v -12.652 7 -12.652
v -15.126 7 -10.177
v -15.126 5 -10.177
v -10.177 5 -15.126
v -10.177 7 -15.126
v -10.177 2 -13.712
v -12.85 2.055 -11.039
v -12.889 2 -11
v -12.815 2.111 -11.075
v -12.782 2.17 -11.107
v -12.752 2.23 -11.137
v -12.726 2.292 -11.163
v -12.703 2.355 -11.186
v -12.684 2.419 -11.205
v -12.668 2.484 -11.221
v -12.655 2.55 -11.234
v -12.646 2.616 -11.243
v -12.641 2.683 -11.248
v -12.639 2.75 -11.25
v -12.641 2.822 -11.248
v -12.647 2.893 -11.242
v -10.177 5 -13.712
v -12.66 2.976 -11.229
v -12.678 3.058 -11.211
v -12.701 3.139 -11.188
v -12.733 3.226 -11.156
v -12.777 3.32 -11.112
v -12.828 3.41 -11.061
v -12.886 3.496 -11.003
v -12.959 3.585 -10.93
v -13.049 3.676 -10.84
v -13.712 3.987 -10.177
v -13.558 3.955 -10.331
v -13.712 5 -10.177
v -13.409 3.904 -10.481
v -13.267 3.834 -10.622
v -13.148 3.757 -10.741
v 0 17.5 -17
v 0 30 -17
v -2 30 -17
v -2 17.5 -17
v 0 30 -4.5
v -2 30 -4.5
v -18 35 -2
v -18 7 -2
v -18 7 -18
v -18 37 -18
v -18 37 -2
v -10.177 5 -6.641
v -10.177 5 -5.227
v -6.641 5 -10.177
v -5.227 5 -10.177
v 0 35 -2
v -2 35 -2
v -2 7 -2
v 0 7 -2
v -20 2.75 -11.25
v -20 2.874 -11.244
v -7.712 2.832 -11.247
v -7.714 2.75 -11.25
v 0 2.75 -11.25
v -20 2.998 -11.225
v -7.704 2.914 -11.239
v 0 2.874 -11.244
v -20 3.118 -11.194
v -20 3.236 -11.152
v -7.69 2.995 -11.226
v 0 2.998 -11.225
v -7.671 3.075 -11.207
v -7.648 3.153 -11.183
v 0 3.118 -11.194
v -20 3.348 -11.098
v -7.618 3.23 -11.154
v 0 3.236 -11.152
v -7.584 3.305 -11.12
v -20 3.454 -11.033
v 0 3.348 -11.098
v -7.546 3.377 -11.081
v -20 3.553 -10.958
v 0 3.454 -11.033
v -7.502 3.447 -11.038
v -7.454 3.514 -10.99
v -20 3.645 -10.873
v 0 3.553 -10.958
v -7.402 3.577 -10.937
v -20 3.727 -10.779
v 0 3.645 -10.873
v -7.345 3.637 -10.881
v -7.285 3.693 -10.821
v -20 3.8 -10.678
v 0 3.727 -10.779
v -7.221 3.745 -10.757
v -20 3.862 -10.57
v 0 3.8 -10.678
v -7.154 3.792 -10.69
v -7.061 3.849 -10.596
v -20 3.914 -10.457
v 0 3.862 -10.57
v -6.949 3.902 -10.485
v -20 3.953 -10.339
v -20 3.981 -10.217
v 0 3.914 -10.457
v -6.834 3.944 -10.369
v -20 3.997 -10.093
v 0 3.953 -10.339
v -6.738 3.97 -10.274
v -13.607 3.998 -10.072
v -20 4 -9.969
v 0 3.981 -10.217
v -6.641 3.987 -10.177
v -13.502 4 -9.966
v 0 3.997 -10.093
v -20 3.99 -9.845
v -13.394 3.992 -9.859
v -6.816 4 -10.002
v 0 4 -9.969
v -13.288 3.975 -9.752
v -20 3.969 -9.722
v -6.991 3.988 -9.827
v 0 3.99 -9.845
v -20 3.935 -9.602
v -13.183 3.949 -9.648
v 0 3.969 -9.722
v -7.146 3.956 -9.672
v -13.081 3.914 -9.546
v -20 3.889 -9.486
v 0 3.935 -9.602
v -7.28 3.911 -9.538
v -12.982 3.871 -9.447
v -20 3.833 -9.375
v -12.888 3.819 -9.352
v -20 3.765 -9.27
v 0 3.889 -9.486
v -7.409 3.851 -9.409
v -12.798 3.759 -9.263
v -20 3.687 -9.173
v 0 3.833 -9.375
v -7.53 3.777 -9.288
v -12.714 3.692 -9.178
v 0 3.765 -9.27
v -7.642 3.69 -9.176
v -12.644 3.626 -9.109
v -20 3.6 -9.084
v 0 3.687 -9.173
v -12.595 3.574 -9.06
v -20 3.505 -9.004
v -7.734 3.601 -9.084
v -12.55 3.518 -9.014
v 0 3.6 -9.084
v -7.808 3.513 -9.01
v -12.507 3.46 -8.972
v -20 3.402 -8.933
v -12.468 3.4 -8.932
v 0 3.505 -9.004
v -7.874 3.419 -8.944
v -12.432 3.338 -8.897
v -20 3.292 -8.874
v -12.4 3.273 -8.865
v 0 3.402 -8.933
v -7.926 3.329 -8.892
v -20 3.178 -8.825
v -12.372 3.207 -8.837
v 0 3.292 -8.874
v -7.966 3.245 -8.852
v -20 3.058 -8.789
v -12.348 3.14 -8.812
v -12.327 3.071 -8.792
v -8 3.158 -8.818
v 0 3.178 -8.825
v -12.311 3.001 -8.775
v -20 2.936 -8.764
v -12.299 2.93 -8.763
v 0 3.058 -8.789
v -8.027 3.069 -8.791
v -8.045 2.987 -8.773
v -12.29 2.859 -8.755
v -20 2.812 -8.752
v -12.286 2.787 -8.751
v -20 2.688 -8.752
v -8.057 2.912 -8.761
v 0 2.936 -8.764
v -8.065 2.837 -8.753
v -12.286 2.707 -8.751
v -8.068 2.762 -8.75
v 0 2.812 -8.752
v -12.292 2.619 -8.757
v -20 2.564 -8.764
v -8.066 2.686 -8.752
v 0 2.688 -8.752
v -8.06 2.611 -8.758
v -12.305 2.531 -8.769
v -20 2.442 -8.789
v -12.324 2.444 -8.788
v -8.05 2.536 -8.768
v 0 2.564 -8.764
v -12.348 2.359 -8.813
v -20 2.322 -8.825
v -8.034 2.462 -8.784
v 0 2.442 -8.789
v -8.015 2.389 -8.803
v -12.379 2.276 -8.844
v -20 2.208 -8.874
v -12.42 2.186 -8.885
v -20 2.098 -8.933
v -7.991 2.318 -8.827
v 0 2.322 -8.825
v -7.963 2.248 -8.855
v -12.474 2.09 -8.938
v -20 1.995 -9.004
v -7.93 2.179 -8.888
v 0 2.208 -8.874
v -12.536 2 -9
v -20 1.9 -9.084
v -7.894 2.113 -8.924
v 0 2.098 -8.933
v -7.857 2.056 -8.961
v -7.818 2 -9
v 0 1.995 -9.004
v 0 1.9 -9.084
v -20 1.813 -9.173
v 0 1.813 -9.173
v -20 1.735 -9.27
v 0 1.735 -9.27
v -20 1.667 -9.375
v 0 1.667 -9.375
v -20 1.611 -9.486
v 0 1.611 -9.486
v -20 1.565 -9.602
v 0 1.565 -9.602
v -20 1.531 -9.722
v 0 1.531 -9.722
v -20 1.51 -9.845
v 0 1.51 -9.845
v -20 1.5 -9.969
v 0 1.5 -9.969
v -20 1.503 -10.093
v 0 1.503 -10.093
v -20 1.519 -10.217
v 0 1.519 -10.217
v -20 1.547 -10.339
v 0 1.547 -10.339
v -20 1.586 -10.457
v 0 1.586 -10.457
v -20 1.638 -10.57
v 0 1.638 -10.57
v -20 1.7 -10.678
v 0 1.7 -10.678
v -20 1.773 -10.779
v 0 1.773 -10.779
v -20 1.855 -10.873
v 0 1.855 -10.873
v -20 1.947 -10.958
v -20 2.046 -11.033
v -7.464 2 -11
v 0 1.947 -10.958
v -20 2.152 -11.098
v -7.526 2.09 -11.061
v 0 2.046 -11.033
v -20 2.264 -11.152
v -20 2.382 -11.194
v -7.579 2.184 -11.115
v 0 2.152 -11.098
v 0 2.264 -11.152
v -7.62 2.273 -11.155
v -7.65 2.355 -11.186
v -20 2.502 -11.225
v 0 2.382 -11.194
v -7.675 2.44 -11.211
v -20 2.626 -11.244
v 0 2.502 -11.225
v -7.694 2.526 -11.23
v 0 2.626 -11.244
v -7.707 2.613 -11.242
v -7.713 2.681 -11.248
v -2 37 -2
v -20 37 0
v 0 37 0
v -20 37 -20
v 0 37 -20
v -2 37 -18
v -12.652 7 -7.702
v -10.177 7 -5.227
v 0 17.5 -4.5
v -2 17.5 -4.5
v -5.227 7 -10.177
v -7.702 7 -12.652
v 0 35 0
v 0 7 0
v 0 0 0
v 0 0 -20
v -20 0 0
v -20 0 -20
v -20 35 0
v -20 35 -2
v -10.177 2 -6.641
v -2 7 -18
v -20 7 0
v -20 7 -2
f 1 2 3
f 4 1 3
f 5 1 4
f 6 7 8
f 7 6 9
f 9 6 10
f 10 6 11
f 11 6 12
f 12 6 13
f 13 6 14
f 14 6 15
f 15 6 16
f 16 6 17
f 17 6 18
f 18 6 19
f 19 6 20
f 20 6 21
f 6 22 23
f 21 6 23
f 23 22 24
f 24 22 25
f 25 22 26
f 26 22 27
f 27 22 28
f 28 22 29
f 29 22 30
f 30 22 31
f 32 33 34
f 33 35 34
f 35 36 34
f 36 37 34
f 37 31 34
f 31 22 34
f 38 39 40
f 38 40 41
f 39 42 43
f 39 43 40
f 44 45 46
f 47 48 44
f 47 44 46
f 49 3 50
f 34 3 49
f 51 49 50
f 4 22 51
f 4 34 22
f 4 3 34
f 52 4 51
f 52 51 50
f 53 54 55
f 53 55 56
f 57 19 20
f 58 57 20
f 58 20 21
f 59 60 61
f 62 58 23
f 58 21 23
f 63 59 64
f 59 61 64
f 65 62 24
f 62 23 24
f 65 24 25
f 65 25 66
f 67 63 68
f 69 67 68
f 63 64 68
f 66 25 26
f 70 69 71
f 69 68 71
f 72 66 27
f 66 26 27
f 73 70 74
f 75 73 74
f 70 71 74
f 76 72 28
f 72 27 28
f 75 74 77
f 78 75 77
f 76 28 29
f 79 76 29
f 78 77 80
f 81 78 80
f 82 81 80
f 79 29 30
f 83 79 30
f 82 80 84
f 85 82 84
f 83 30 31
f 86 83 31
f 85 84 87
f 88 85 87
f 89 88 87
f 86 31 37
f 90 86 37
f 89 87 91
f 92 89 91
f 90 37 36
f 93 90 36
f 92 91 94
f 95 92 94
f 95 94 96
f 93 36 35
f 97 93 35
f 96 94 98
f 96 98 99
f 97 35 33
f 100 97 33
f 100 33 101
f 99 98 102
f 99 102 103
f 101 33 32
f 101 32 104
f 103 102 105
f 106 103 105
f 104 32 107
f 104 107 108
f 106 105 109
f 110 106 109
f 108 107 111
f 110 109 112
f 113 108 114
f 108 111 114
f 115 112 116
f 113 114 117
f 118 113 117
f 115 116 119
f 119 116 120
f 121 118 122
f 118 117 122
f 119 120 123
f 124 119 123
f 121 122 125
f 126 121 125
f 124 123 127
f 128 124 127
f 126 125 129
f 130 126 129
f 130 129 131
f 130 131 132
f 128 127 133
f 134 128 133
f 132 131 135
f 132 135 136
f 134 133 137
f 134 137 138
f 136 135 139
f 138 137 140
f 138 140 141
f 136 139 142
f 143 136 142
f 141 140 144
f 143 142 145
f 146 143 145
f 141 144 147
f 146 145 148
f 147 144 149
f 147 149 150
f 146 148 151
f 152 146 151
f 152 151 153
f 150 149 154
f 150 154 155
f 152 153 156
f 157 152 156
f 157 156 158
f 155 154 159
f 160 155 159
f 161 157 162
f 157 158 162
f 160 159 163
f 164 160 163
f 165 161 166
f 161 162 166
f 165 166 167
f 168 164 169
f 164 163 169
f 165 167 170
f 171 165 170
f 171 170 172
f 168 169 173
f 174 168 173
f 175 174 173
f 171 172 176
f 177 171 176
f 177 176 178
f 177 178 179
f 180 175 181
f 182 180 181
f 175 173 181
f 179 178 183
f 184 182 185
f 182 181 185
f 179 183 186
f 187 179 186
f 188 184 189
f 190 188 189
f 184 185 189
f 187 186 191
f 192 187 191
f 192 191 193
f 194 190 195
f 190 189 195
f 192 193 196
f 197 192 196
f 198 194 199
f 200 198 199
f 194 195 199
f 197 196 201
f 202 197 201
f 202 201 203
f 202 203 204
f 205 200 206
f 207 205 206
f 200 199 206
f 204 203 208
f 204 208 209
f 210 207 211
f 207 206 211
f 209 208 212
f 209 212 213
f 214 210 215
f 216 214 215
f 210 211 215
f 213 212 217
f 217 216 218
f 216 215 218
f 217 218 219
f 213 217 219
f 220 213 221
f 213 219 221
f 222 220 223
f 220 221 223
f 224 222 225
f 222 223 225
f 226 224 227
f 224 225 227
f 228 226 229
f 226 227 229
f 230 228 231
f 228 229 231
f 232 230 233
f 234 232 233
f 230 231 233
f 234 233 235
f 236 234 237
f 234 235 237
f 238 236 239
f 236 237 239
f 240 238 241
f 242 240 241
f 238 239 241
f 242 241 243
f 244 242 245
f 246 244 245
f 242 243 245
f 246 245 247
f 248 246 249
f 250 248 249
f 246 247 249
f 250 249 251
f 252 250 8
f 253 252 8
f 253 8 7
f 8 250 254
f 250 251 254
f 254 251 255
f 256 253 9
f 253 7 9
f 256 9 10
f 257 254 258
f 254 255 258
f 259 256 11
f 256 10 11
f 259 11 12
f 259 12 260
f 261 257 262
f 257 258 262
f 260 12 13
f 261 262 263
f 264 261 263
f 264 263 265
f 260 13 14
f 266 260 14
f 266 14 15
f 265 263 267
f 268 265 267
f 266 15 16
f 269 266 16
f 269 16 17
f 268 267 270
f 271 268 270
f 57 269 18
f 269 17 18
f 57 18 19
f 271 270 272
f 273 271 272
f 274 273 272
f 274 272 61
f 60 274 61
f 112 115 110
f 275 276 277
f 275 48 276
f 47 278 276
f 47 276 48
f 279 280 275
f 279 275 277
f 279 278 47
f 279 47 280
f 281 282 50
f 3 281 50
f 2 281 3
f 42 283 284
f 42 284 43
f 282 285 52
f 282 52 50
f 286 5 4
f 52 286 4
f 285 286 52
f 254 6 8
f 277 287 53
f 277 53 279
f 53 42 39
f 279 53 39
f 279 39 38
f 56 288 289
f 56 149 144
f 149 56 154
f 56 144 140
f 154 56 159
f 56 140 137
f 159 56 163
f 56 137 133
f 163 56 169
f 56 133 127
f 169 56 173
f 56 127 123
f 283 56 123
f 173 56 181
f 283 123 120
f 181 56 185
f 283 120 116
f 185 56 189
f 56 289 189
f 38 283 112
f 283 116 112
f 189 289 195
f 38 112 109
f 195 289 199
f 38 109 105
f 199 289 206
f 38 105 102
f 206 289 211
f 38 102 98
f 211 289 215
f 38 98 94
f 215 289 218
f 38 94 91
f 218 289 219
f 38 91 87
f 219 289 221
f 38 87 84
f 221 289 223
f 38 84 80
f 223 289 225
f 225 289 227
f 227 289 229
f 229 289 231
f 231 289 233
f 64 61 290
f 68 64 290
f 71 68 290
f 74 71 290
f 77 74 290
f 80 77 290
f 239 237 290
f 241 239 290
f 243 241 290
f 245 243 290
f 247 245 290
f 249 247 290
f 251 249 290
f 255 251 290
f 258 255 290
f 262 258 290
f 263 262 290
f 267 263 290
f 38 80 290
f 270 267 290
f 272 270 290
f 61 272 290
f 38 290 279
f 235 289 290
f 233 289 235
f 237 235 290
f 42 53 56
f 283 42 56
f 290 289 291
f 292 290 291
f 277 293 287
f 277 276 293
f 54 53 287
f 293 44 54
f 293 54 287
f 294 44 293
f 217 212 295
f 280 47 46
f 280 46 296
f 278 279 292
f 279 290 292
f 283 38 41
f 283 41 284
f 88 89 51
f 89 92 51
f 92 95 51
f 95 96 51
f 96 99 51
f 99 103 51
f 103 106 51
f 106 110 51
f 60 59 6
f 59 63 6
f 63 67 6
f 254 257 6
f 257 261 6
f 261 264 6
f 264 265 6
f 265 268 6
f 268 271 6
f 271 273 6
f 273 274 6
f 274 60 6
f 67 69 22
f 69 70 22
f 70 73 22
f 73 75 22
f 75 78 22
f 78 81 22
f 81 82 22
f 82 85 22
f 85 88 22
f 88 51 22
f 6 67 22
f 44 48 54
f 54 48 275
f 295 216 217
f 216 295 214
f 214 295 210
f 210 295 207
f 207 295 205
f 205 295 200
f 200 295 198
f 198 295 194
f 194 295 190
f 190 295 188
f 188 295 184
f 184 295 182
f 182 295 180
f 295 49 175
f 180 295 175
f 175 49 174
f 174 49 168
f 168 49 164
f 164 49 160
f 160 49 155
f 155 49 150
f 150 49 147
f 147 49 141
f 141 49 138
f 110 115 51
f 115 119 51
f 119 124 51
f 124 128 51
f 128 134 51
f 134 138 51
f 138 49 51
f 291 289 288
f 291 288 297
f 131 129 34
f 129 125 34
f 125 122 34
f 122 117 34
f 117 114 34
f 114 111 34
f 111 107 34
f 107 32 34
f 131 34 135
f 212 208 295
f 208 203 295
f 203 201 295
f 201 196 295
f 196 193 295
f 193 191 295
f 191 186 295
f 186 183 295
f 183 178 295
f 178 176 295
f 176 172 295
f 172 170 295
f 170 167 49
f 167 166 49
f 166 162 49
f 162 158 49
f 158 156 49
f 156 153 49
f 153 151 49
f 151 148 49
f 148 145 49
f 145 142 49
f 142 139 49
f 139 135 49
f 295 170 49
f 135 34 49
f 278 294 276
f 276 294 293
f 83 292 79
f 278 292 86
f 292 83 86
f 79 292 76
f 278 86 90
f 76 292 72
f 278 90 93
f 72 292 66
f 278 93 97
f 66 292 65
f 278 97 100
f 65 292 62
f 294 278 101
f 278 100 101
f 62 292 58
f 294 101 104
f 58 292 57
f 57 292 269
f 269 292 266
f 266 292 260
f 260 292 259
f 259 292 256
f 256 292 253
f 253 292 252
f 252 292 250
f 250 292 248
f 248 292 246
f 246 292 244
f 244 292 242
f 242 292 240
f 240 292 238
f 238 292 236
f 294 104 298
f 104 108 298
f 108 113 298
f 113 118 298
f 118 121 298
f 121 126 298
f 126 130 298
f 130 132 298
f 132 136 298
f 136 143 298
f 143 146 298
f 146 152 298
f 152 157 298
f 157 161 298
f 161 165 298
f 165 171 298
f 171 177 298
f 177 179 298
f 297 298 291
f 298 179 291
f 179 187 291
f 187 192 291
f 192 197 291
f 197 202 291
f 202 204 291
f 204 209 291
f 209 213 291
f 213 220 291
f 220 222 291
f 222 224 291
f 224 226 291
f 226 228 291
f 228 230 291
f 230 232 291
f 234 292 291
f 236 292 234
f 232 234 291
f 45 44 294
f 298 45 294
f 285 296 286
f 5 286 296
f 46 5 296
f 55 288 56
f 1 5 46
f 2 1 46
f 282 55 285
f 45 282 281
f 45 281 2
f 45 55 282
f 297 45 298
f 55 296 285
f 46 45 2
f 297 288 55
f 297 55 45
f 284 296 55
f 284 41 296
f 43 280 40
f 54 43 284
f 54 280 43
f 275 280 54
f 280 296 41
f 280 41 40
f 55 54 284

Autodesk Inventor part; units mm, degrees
ref_plane "YZ Plane" through (0, 0, 0) normal (1, 0, 0) x (0, 1, 0)
sketch "Sketch1" plane through (0, 0, 0) normal (0, 1, 0) x (-1, 0, 0)
  line L0 (0, 0) -> (20, 0)
  line L1 (20, 0) -> (20, -20)
  line L2 (20, -20) -> (0, -20)
  line L3 (0, -20) -> (0, 0)
  dimension "d0" = 20
  dimension "d1" = 20
extrude "Extrusion1" add sketch "Sketch1" along normal blind 10
sketch "Sketch4" plane through (0, 10, 0) normal (0, 1, 0) x (1, 0, 0)
  line L0 (0, 20) -> (-20, 20) projected
  line L1 (-20, 20) -> (-20, 0) projected
  line L2 (-20, 0) -> (0, 0) projected
  line L3 (0, 0) -> (0, 20) projected
  line L4 (0, 20) -> (-20, 20) projected
  line L5 (-20, 20) -> (0, 0)
  line L6 (-10.1768, 10.1768) -> (-7.7019, 12.6517)
  line L7 (-7.7019, 12.6517) -> (-5.227, 10.1768)
  line L8 (-5.227, 10.1768) -> (-7.7019, 7.7019)
  line L9 (-7.7019, 7.7019) -> (-10.1768, 10.1768)
  line L10 (-10.1768, 10.1768) -> (-12.6517, 7.7019)
  line L11 (-12.6517, 7.7019) -> (-15.1265, 10.1768)
  line L12 (-15.1265, 10.1768) -> (-12.6517, 12.6517)
  line L13 (-12.6517, 12.6517) -> (-10.1768, 10.1768)
  line L14 (-12.6517, 12.6517) -> (-10.1768, 15.1265)
  line L15 (-10.1768, 15.1265) -> (-7.7019, 12.6517)
  line L16 (-7.7019, 12.6517) -> (-10.1768, 10.1768)
  line L17 (-10.1768, 10.1768) -> (-12.6517, 12.6517)
  line L18 (-12.6517, 7.7019) -> (-10.1768, 10.1768)
  line L19 (-10.1768, 10.1768) -> (-7.7019, 7.7019)
  line L20 (-7.7019, 7.7019) -> (-10.1768, 5.227)
  line L21 (-10.1768, 5.227) -> (-12.6517, 7.7019)
  dimension "d10" = 3.5
  dimension "d11" = 3.5
  dimension "d12" = 3.5
  dimension "d13" = 3.5
extrude "Extrusion3" cut sketch "Sketch4" against normal blind 8 contours L14 L15 L6 L5 | L5 L10 L11 L12 | L20 L21 L10 L5 | L5 L6 L7 L8
sketch "Sketch5" plane through (0, 10, 0) normal (0, 1, 0) x (1, 0, 0)
  line L0 (-5.227, 10.1768) -> (-10.1768, 5.227) projected
  line L1 (-10.1768, 5.227) -> (-15.1265, 10.1768) projected
  line L2 (-15.1265, 10.1768) -> (-10.1768, 15.1265) projected
  line L3 (-10.1768, 15.1265) -> (-5.227, 10.1768) projected
  line L4 (0, 20) -> (-20, 20) projected
  line L5 (-20, 20) -> (-20, 0) projected
  line L6 (-20, 0) -> (0, 0) projected
  line L7 (0, 0) -> (0, 20) projected
  line L8 (-18, 18) -> (-2, 18)
  line L9 (-2, 18) -> (-2, 2)
  line L10 (-2, 2) -> (-18, 2)
  line L11 (-18, 2) -> (-18, 18)
  line L12 (-18, 2) -> (-18, 0)
  line L13 (-2, 2) -> (-2, 0)
  line L14 (-20, 0) -> (0, 0) projected
  line L15 (-18, 2) -> (-20, 2)
  line L16 (-20, 20) -> (-20, 0) projected
  line L17 (-2, 2) -> (0, 2)
  line L18 (0, 0) -> (0, 20) projected
  point P0 (0, 2)
  dimension "d16" = 2
extrude "Extrusion4" add sketch "Sketch5" along normal blind 27 contours L7 L17 L9 L8 L11 L15 L5 L4
ref_plane "Work Plane1" through (-10, 10, -2) normal (1, 0, 0) x (0, 0, -1)
sketch "Sketch6" plane through (-10, 10, -2) normal (1, 0, 0) x (0, 0, -1)
  line L0 (3.227, 0) -> (8.1768, 0) projected
  line L1 (3.227, 0) -> (3.227, -8) projected
  line L2 (3.227, -8) -> (8.1768, -8) projected
  line L3 (8.1768, 0) -> (8.1768, -8) projected
  line L4 (8.1768, 0) -> (13.1265, 0) projected
  line L5 (8.1768, 0) -> (8.1768, -8) projected
  line L6 (8.1768, -8) -> (13.1265, -8) projected
  line L7 (13.1265, 0) -> (13.1265, -8) projected
  line L8 (16, 0) -> (0, 0) projected
  line L9 (16, 0) -> (16, 27) projected
  line L10 (0, 27) -> (16, 27) projected
  line L11 (0, 0) -> (0, 27) projected
  line L12 (8.1768, 0) -> (8.1768, -8) projected
  line L13 (8.1768, -8) -> (8.1768, -7.25)
  circle A0 centre (8.1768, -7.25) radius 0.75
  point P0 (-2, -10)
  dimension "d20" = 0.75
  dimension "d21" = 1.5
extrude "Extrusion5" cut sketch "Sketch6" along normal mid plane 27 contours A0 L3 | L3 A0
ref_plane "Work Plane2" through (-20, 0, -10) normal (0, 0, 1) x (1, 0, 0)
sketch "Sketch8" plane through (-20, 10, -2) normal (0, 0, 1) x (1, 0, 0)
  line L0 (2, 0) -> (0, 0) projected
  line L1 (2, 0) -> (2, 27) projected
  line L2 (0, 27) -> (2, 27) projected
  line L3 (0, 0) -> (0, 27) projected
  line L4 (20, 0) -> (18, 0) projected
  line L5 (20, 0) -> (20, 27) projected
  line L6 (18, 27) -> (20, 27) projected
  line L7 (18, 0) -> (18, 27) projected
  line L8 (20, 27) -> (0, 27) projected
  line L9 (0, 27) -> (20, 27)
  line L10 (20, 27) -> (20, 25)
  line L11 (20, 25) -> (0, 25)
  line L12 (0, 25) -> (0, 27)
  point P0 (20, -10)
  point P1 (0, 25)
  dimension "d30" = 20
  dimension "d31" = 2
extrude "Extrusion6" add sketch "Sketch8" along normal blind 2 contours L11 L3 L2 L1 | L1 L8 L7 L11 | L7 L6 L5 L11
ref_plane "Work Plane3" through (0, 8, 0) normal (0, 1, 0) x (1, 0, 0)
sketch "Sketch9" plane through (0, 8, 0) normal (0, 1, 0) x (1, 0, 0)
  line L0 (-10.1768, 15.1265) -> (-5.227, 10.1768) projected
  line L1 (-15.1265, 10.1768) -> (-10.1768, 15.1265) projected
  line L2 (-10.1768, 5.227) -> (-15.1265, 10.1768) projected
  line L3 (-5.227, 10.1768) -> (-10.1768, 5.227) projected
  line L4 (-6.6412, 10.1768) -> (-10.1768, 13.7123)
  line L5 (-10.1768, 13.7123) -> (-13.7123, 10.1768)
  line L6 (-13.7123, 10.1768) -> (-10.1768, 6.6412)
  line L7 (-10.1768, 6.6412) -> (-6.6412, 10.1768)
  point P0 (0, 0)
  dimension "d35" = 1
extrude "Extrusion7" add sketch "Sketch9" against normal blind 6
extrude "Extrusion8" cut sketch "Sketch6" along normal mid plane 27 contours A0 L3 | L3 A0
sketch "Sketch10" plane through (0, 0, 0) normal (1, 0, 0) x (0, 0, -1)
  line L0 (0, 0) -> (20, 0) projected
  line L1 (20, 0) -> (20, 37) projected
  line L2 (20, 37) -> (0, 37) projected
  line L3 (0, 35) -> (0, 37) projected
  line L4 (2, 35) -> (0, 35) projected
  line L5 (2, 10) -> (2, 35) projected
  line L6 (0, 10) -> (2, 10) projected
  line L7 (0, 0) -> (0, 10) projected
  line L8 (2, 35) -> (10, 35)
  line L9 (10, 35) -> (4.5, 35)
  line L10 (4.5, 35) -> (4.5, 30)
  line L11 (4.5, 30) -> (17, 30)
  line L12 (17, 30) -> (17, 17.5)
  line L13 (17, 17.5) -> (4.5, 17.5)
  line L14 (4.5, 17.5) -> (4.5, 30)
  dimension "d40" = 5.5
  dimension "d41" = 5
  dimension "d42" = 12.5
  dimension "d43" = 12.5
  dimension "d44" = 8
extrude "Extrusion9" cut sketch "Sketch10" against normal blind 6 contours L11 L12 L13 L14
move faces "Move1" translate (0, -3, 0) faces at (-8.5269, 8, -13.0052)
move faces "Move3" translate (0, -3, 0) faces at (-5.8013, 10, -5.8013)
sketch "Sketch12" plane through (-10, 10, -2) normal (1, 0, 0) x (0, 0, -1)
  circle A0 centre (8, -7.25) radius 0.75 projected
  point P0 (-2, -10)
extrude "Extrusion10" cut sketch "Sketch12" along normal mid plane 100
sketch "Sketch13" plane through (0, 0, 0) normal (1, 0, 0) x (0, 0, -1)
  arc A0 (10.0884, 3.4948) -> (10, 2) centre (10, 2.75) ccw projected
  circle A1 centre (10, 2.75) radius 1.25
  point P0 (0, 0)
  dimension "d58" = 2.5
extrude "Extrusion11" cut sketch "Sketch13" along normal mid plane 500
properties part number "latticeChamberv6"
